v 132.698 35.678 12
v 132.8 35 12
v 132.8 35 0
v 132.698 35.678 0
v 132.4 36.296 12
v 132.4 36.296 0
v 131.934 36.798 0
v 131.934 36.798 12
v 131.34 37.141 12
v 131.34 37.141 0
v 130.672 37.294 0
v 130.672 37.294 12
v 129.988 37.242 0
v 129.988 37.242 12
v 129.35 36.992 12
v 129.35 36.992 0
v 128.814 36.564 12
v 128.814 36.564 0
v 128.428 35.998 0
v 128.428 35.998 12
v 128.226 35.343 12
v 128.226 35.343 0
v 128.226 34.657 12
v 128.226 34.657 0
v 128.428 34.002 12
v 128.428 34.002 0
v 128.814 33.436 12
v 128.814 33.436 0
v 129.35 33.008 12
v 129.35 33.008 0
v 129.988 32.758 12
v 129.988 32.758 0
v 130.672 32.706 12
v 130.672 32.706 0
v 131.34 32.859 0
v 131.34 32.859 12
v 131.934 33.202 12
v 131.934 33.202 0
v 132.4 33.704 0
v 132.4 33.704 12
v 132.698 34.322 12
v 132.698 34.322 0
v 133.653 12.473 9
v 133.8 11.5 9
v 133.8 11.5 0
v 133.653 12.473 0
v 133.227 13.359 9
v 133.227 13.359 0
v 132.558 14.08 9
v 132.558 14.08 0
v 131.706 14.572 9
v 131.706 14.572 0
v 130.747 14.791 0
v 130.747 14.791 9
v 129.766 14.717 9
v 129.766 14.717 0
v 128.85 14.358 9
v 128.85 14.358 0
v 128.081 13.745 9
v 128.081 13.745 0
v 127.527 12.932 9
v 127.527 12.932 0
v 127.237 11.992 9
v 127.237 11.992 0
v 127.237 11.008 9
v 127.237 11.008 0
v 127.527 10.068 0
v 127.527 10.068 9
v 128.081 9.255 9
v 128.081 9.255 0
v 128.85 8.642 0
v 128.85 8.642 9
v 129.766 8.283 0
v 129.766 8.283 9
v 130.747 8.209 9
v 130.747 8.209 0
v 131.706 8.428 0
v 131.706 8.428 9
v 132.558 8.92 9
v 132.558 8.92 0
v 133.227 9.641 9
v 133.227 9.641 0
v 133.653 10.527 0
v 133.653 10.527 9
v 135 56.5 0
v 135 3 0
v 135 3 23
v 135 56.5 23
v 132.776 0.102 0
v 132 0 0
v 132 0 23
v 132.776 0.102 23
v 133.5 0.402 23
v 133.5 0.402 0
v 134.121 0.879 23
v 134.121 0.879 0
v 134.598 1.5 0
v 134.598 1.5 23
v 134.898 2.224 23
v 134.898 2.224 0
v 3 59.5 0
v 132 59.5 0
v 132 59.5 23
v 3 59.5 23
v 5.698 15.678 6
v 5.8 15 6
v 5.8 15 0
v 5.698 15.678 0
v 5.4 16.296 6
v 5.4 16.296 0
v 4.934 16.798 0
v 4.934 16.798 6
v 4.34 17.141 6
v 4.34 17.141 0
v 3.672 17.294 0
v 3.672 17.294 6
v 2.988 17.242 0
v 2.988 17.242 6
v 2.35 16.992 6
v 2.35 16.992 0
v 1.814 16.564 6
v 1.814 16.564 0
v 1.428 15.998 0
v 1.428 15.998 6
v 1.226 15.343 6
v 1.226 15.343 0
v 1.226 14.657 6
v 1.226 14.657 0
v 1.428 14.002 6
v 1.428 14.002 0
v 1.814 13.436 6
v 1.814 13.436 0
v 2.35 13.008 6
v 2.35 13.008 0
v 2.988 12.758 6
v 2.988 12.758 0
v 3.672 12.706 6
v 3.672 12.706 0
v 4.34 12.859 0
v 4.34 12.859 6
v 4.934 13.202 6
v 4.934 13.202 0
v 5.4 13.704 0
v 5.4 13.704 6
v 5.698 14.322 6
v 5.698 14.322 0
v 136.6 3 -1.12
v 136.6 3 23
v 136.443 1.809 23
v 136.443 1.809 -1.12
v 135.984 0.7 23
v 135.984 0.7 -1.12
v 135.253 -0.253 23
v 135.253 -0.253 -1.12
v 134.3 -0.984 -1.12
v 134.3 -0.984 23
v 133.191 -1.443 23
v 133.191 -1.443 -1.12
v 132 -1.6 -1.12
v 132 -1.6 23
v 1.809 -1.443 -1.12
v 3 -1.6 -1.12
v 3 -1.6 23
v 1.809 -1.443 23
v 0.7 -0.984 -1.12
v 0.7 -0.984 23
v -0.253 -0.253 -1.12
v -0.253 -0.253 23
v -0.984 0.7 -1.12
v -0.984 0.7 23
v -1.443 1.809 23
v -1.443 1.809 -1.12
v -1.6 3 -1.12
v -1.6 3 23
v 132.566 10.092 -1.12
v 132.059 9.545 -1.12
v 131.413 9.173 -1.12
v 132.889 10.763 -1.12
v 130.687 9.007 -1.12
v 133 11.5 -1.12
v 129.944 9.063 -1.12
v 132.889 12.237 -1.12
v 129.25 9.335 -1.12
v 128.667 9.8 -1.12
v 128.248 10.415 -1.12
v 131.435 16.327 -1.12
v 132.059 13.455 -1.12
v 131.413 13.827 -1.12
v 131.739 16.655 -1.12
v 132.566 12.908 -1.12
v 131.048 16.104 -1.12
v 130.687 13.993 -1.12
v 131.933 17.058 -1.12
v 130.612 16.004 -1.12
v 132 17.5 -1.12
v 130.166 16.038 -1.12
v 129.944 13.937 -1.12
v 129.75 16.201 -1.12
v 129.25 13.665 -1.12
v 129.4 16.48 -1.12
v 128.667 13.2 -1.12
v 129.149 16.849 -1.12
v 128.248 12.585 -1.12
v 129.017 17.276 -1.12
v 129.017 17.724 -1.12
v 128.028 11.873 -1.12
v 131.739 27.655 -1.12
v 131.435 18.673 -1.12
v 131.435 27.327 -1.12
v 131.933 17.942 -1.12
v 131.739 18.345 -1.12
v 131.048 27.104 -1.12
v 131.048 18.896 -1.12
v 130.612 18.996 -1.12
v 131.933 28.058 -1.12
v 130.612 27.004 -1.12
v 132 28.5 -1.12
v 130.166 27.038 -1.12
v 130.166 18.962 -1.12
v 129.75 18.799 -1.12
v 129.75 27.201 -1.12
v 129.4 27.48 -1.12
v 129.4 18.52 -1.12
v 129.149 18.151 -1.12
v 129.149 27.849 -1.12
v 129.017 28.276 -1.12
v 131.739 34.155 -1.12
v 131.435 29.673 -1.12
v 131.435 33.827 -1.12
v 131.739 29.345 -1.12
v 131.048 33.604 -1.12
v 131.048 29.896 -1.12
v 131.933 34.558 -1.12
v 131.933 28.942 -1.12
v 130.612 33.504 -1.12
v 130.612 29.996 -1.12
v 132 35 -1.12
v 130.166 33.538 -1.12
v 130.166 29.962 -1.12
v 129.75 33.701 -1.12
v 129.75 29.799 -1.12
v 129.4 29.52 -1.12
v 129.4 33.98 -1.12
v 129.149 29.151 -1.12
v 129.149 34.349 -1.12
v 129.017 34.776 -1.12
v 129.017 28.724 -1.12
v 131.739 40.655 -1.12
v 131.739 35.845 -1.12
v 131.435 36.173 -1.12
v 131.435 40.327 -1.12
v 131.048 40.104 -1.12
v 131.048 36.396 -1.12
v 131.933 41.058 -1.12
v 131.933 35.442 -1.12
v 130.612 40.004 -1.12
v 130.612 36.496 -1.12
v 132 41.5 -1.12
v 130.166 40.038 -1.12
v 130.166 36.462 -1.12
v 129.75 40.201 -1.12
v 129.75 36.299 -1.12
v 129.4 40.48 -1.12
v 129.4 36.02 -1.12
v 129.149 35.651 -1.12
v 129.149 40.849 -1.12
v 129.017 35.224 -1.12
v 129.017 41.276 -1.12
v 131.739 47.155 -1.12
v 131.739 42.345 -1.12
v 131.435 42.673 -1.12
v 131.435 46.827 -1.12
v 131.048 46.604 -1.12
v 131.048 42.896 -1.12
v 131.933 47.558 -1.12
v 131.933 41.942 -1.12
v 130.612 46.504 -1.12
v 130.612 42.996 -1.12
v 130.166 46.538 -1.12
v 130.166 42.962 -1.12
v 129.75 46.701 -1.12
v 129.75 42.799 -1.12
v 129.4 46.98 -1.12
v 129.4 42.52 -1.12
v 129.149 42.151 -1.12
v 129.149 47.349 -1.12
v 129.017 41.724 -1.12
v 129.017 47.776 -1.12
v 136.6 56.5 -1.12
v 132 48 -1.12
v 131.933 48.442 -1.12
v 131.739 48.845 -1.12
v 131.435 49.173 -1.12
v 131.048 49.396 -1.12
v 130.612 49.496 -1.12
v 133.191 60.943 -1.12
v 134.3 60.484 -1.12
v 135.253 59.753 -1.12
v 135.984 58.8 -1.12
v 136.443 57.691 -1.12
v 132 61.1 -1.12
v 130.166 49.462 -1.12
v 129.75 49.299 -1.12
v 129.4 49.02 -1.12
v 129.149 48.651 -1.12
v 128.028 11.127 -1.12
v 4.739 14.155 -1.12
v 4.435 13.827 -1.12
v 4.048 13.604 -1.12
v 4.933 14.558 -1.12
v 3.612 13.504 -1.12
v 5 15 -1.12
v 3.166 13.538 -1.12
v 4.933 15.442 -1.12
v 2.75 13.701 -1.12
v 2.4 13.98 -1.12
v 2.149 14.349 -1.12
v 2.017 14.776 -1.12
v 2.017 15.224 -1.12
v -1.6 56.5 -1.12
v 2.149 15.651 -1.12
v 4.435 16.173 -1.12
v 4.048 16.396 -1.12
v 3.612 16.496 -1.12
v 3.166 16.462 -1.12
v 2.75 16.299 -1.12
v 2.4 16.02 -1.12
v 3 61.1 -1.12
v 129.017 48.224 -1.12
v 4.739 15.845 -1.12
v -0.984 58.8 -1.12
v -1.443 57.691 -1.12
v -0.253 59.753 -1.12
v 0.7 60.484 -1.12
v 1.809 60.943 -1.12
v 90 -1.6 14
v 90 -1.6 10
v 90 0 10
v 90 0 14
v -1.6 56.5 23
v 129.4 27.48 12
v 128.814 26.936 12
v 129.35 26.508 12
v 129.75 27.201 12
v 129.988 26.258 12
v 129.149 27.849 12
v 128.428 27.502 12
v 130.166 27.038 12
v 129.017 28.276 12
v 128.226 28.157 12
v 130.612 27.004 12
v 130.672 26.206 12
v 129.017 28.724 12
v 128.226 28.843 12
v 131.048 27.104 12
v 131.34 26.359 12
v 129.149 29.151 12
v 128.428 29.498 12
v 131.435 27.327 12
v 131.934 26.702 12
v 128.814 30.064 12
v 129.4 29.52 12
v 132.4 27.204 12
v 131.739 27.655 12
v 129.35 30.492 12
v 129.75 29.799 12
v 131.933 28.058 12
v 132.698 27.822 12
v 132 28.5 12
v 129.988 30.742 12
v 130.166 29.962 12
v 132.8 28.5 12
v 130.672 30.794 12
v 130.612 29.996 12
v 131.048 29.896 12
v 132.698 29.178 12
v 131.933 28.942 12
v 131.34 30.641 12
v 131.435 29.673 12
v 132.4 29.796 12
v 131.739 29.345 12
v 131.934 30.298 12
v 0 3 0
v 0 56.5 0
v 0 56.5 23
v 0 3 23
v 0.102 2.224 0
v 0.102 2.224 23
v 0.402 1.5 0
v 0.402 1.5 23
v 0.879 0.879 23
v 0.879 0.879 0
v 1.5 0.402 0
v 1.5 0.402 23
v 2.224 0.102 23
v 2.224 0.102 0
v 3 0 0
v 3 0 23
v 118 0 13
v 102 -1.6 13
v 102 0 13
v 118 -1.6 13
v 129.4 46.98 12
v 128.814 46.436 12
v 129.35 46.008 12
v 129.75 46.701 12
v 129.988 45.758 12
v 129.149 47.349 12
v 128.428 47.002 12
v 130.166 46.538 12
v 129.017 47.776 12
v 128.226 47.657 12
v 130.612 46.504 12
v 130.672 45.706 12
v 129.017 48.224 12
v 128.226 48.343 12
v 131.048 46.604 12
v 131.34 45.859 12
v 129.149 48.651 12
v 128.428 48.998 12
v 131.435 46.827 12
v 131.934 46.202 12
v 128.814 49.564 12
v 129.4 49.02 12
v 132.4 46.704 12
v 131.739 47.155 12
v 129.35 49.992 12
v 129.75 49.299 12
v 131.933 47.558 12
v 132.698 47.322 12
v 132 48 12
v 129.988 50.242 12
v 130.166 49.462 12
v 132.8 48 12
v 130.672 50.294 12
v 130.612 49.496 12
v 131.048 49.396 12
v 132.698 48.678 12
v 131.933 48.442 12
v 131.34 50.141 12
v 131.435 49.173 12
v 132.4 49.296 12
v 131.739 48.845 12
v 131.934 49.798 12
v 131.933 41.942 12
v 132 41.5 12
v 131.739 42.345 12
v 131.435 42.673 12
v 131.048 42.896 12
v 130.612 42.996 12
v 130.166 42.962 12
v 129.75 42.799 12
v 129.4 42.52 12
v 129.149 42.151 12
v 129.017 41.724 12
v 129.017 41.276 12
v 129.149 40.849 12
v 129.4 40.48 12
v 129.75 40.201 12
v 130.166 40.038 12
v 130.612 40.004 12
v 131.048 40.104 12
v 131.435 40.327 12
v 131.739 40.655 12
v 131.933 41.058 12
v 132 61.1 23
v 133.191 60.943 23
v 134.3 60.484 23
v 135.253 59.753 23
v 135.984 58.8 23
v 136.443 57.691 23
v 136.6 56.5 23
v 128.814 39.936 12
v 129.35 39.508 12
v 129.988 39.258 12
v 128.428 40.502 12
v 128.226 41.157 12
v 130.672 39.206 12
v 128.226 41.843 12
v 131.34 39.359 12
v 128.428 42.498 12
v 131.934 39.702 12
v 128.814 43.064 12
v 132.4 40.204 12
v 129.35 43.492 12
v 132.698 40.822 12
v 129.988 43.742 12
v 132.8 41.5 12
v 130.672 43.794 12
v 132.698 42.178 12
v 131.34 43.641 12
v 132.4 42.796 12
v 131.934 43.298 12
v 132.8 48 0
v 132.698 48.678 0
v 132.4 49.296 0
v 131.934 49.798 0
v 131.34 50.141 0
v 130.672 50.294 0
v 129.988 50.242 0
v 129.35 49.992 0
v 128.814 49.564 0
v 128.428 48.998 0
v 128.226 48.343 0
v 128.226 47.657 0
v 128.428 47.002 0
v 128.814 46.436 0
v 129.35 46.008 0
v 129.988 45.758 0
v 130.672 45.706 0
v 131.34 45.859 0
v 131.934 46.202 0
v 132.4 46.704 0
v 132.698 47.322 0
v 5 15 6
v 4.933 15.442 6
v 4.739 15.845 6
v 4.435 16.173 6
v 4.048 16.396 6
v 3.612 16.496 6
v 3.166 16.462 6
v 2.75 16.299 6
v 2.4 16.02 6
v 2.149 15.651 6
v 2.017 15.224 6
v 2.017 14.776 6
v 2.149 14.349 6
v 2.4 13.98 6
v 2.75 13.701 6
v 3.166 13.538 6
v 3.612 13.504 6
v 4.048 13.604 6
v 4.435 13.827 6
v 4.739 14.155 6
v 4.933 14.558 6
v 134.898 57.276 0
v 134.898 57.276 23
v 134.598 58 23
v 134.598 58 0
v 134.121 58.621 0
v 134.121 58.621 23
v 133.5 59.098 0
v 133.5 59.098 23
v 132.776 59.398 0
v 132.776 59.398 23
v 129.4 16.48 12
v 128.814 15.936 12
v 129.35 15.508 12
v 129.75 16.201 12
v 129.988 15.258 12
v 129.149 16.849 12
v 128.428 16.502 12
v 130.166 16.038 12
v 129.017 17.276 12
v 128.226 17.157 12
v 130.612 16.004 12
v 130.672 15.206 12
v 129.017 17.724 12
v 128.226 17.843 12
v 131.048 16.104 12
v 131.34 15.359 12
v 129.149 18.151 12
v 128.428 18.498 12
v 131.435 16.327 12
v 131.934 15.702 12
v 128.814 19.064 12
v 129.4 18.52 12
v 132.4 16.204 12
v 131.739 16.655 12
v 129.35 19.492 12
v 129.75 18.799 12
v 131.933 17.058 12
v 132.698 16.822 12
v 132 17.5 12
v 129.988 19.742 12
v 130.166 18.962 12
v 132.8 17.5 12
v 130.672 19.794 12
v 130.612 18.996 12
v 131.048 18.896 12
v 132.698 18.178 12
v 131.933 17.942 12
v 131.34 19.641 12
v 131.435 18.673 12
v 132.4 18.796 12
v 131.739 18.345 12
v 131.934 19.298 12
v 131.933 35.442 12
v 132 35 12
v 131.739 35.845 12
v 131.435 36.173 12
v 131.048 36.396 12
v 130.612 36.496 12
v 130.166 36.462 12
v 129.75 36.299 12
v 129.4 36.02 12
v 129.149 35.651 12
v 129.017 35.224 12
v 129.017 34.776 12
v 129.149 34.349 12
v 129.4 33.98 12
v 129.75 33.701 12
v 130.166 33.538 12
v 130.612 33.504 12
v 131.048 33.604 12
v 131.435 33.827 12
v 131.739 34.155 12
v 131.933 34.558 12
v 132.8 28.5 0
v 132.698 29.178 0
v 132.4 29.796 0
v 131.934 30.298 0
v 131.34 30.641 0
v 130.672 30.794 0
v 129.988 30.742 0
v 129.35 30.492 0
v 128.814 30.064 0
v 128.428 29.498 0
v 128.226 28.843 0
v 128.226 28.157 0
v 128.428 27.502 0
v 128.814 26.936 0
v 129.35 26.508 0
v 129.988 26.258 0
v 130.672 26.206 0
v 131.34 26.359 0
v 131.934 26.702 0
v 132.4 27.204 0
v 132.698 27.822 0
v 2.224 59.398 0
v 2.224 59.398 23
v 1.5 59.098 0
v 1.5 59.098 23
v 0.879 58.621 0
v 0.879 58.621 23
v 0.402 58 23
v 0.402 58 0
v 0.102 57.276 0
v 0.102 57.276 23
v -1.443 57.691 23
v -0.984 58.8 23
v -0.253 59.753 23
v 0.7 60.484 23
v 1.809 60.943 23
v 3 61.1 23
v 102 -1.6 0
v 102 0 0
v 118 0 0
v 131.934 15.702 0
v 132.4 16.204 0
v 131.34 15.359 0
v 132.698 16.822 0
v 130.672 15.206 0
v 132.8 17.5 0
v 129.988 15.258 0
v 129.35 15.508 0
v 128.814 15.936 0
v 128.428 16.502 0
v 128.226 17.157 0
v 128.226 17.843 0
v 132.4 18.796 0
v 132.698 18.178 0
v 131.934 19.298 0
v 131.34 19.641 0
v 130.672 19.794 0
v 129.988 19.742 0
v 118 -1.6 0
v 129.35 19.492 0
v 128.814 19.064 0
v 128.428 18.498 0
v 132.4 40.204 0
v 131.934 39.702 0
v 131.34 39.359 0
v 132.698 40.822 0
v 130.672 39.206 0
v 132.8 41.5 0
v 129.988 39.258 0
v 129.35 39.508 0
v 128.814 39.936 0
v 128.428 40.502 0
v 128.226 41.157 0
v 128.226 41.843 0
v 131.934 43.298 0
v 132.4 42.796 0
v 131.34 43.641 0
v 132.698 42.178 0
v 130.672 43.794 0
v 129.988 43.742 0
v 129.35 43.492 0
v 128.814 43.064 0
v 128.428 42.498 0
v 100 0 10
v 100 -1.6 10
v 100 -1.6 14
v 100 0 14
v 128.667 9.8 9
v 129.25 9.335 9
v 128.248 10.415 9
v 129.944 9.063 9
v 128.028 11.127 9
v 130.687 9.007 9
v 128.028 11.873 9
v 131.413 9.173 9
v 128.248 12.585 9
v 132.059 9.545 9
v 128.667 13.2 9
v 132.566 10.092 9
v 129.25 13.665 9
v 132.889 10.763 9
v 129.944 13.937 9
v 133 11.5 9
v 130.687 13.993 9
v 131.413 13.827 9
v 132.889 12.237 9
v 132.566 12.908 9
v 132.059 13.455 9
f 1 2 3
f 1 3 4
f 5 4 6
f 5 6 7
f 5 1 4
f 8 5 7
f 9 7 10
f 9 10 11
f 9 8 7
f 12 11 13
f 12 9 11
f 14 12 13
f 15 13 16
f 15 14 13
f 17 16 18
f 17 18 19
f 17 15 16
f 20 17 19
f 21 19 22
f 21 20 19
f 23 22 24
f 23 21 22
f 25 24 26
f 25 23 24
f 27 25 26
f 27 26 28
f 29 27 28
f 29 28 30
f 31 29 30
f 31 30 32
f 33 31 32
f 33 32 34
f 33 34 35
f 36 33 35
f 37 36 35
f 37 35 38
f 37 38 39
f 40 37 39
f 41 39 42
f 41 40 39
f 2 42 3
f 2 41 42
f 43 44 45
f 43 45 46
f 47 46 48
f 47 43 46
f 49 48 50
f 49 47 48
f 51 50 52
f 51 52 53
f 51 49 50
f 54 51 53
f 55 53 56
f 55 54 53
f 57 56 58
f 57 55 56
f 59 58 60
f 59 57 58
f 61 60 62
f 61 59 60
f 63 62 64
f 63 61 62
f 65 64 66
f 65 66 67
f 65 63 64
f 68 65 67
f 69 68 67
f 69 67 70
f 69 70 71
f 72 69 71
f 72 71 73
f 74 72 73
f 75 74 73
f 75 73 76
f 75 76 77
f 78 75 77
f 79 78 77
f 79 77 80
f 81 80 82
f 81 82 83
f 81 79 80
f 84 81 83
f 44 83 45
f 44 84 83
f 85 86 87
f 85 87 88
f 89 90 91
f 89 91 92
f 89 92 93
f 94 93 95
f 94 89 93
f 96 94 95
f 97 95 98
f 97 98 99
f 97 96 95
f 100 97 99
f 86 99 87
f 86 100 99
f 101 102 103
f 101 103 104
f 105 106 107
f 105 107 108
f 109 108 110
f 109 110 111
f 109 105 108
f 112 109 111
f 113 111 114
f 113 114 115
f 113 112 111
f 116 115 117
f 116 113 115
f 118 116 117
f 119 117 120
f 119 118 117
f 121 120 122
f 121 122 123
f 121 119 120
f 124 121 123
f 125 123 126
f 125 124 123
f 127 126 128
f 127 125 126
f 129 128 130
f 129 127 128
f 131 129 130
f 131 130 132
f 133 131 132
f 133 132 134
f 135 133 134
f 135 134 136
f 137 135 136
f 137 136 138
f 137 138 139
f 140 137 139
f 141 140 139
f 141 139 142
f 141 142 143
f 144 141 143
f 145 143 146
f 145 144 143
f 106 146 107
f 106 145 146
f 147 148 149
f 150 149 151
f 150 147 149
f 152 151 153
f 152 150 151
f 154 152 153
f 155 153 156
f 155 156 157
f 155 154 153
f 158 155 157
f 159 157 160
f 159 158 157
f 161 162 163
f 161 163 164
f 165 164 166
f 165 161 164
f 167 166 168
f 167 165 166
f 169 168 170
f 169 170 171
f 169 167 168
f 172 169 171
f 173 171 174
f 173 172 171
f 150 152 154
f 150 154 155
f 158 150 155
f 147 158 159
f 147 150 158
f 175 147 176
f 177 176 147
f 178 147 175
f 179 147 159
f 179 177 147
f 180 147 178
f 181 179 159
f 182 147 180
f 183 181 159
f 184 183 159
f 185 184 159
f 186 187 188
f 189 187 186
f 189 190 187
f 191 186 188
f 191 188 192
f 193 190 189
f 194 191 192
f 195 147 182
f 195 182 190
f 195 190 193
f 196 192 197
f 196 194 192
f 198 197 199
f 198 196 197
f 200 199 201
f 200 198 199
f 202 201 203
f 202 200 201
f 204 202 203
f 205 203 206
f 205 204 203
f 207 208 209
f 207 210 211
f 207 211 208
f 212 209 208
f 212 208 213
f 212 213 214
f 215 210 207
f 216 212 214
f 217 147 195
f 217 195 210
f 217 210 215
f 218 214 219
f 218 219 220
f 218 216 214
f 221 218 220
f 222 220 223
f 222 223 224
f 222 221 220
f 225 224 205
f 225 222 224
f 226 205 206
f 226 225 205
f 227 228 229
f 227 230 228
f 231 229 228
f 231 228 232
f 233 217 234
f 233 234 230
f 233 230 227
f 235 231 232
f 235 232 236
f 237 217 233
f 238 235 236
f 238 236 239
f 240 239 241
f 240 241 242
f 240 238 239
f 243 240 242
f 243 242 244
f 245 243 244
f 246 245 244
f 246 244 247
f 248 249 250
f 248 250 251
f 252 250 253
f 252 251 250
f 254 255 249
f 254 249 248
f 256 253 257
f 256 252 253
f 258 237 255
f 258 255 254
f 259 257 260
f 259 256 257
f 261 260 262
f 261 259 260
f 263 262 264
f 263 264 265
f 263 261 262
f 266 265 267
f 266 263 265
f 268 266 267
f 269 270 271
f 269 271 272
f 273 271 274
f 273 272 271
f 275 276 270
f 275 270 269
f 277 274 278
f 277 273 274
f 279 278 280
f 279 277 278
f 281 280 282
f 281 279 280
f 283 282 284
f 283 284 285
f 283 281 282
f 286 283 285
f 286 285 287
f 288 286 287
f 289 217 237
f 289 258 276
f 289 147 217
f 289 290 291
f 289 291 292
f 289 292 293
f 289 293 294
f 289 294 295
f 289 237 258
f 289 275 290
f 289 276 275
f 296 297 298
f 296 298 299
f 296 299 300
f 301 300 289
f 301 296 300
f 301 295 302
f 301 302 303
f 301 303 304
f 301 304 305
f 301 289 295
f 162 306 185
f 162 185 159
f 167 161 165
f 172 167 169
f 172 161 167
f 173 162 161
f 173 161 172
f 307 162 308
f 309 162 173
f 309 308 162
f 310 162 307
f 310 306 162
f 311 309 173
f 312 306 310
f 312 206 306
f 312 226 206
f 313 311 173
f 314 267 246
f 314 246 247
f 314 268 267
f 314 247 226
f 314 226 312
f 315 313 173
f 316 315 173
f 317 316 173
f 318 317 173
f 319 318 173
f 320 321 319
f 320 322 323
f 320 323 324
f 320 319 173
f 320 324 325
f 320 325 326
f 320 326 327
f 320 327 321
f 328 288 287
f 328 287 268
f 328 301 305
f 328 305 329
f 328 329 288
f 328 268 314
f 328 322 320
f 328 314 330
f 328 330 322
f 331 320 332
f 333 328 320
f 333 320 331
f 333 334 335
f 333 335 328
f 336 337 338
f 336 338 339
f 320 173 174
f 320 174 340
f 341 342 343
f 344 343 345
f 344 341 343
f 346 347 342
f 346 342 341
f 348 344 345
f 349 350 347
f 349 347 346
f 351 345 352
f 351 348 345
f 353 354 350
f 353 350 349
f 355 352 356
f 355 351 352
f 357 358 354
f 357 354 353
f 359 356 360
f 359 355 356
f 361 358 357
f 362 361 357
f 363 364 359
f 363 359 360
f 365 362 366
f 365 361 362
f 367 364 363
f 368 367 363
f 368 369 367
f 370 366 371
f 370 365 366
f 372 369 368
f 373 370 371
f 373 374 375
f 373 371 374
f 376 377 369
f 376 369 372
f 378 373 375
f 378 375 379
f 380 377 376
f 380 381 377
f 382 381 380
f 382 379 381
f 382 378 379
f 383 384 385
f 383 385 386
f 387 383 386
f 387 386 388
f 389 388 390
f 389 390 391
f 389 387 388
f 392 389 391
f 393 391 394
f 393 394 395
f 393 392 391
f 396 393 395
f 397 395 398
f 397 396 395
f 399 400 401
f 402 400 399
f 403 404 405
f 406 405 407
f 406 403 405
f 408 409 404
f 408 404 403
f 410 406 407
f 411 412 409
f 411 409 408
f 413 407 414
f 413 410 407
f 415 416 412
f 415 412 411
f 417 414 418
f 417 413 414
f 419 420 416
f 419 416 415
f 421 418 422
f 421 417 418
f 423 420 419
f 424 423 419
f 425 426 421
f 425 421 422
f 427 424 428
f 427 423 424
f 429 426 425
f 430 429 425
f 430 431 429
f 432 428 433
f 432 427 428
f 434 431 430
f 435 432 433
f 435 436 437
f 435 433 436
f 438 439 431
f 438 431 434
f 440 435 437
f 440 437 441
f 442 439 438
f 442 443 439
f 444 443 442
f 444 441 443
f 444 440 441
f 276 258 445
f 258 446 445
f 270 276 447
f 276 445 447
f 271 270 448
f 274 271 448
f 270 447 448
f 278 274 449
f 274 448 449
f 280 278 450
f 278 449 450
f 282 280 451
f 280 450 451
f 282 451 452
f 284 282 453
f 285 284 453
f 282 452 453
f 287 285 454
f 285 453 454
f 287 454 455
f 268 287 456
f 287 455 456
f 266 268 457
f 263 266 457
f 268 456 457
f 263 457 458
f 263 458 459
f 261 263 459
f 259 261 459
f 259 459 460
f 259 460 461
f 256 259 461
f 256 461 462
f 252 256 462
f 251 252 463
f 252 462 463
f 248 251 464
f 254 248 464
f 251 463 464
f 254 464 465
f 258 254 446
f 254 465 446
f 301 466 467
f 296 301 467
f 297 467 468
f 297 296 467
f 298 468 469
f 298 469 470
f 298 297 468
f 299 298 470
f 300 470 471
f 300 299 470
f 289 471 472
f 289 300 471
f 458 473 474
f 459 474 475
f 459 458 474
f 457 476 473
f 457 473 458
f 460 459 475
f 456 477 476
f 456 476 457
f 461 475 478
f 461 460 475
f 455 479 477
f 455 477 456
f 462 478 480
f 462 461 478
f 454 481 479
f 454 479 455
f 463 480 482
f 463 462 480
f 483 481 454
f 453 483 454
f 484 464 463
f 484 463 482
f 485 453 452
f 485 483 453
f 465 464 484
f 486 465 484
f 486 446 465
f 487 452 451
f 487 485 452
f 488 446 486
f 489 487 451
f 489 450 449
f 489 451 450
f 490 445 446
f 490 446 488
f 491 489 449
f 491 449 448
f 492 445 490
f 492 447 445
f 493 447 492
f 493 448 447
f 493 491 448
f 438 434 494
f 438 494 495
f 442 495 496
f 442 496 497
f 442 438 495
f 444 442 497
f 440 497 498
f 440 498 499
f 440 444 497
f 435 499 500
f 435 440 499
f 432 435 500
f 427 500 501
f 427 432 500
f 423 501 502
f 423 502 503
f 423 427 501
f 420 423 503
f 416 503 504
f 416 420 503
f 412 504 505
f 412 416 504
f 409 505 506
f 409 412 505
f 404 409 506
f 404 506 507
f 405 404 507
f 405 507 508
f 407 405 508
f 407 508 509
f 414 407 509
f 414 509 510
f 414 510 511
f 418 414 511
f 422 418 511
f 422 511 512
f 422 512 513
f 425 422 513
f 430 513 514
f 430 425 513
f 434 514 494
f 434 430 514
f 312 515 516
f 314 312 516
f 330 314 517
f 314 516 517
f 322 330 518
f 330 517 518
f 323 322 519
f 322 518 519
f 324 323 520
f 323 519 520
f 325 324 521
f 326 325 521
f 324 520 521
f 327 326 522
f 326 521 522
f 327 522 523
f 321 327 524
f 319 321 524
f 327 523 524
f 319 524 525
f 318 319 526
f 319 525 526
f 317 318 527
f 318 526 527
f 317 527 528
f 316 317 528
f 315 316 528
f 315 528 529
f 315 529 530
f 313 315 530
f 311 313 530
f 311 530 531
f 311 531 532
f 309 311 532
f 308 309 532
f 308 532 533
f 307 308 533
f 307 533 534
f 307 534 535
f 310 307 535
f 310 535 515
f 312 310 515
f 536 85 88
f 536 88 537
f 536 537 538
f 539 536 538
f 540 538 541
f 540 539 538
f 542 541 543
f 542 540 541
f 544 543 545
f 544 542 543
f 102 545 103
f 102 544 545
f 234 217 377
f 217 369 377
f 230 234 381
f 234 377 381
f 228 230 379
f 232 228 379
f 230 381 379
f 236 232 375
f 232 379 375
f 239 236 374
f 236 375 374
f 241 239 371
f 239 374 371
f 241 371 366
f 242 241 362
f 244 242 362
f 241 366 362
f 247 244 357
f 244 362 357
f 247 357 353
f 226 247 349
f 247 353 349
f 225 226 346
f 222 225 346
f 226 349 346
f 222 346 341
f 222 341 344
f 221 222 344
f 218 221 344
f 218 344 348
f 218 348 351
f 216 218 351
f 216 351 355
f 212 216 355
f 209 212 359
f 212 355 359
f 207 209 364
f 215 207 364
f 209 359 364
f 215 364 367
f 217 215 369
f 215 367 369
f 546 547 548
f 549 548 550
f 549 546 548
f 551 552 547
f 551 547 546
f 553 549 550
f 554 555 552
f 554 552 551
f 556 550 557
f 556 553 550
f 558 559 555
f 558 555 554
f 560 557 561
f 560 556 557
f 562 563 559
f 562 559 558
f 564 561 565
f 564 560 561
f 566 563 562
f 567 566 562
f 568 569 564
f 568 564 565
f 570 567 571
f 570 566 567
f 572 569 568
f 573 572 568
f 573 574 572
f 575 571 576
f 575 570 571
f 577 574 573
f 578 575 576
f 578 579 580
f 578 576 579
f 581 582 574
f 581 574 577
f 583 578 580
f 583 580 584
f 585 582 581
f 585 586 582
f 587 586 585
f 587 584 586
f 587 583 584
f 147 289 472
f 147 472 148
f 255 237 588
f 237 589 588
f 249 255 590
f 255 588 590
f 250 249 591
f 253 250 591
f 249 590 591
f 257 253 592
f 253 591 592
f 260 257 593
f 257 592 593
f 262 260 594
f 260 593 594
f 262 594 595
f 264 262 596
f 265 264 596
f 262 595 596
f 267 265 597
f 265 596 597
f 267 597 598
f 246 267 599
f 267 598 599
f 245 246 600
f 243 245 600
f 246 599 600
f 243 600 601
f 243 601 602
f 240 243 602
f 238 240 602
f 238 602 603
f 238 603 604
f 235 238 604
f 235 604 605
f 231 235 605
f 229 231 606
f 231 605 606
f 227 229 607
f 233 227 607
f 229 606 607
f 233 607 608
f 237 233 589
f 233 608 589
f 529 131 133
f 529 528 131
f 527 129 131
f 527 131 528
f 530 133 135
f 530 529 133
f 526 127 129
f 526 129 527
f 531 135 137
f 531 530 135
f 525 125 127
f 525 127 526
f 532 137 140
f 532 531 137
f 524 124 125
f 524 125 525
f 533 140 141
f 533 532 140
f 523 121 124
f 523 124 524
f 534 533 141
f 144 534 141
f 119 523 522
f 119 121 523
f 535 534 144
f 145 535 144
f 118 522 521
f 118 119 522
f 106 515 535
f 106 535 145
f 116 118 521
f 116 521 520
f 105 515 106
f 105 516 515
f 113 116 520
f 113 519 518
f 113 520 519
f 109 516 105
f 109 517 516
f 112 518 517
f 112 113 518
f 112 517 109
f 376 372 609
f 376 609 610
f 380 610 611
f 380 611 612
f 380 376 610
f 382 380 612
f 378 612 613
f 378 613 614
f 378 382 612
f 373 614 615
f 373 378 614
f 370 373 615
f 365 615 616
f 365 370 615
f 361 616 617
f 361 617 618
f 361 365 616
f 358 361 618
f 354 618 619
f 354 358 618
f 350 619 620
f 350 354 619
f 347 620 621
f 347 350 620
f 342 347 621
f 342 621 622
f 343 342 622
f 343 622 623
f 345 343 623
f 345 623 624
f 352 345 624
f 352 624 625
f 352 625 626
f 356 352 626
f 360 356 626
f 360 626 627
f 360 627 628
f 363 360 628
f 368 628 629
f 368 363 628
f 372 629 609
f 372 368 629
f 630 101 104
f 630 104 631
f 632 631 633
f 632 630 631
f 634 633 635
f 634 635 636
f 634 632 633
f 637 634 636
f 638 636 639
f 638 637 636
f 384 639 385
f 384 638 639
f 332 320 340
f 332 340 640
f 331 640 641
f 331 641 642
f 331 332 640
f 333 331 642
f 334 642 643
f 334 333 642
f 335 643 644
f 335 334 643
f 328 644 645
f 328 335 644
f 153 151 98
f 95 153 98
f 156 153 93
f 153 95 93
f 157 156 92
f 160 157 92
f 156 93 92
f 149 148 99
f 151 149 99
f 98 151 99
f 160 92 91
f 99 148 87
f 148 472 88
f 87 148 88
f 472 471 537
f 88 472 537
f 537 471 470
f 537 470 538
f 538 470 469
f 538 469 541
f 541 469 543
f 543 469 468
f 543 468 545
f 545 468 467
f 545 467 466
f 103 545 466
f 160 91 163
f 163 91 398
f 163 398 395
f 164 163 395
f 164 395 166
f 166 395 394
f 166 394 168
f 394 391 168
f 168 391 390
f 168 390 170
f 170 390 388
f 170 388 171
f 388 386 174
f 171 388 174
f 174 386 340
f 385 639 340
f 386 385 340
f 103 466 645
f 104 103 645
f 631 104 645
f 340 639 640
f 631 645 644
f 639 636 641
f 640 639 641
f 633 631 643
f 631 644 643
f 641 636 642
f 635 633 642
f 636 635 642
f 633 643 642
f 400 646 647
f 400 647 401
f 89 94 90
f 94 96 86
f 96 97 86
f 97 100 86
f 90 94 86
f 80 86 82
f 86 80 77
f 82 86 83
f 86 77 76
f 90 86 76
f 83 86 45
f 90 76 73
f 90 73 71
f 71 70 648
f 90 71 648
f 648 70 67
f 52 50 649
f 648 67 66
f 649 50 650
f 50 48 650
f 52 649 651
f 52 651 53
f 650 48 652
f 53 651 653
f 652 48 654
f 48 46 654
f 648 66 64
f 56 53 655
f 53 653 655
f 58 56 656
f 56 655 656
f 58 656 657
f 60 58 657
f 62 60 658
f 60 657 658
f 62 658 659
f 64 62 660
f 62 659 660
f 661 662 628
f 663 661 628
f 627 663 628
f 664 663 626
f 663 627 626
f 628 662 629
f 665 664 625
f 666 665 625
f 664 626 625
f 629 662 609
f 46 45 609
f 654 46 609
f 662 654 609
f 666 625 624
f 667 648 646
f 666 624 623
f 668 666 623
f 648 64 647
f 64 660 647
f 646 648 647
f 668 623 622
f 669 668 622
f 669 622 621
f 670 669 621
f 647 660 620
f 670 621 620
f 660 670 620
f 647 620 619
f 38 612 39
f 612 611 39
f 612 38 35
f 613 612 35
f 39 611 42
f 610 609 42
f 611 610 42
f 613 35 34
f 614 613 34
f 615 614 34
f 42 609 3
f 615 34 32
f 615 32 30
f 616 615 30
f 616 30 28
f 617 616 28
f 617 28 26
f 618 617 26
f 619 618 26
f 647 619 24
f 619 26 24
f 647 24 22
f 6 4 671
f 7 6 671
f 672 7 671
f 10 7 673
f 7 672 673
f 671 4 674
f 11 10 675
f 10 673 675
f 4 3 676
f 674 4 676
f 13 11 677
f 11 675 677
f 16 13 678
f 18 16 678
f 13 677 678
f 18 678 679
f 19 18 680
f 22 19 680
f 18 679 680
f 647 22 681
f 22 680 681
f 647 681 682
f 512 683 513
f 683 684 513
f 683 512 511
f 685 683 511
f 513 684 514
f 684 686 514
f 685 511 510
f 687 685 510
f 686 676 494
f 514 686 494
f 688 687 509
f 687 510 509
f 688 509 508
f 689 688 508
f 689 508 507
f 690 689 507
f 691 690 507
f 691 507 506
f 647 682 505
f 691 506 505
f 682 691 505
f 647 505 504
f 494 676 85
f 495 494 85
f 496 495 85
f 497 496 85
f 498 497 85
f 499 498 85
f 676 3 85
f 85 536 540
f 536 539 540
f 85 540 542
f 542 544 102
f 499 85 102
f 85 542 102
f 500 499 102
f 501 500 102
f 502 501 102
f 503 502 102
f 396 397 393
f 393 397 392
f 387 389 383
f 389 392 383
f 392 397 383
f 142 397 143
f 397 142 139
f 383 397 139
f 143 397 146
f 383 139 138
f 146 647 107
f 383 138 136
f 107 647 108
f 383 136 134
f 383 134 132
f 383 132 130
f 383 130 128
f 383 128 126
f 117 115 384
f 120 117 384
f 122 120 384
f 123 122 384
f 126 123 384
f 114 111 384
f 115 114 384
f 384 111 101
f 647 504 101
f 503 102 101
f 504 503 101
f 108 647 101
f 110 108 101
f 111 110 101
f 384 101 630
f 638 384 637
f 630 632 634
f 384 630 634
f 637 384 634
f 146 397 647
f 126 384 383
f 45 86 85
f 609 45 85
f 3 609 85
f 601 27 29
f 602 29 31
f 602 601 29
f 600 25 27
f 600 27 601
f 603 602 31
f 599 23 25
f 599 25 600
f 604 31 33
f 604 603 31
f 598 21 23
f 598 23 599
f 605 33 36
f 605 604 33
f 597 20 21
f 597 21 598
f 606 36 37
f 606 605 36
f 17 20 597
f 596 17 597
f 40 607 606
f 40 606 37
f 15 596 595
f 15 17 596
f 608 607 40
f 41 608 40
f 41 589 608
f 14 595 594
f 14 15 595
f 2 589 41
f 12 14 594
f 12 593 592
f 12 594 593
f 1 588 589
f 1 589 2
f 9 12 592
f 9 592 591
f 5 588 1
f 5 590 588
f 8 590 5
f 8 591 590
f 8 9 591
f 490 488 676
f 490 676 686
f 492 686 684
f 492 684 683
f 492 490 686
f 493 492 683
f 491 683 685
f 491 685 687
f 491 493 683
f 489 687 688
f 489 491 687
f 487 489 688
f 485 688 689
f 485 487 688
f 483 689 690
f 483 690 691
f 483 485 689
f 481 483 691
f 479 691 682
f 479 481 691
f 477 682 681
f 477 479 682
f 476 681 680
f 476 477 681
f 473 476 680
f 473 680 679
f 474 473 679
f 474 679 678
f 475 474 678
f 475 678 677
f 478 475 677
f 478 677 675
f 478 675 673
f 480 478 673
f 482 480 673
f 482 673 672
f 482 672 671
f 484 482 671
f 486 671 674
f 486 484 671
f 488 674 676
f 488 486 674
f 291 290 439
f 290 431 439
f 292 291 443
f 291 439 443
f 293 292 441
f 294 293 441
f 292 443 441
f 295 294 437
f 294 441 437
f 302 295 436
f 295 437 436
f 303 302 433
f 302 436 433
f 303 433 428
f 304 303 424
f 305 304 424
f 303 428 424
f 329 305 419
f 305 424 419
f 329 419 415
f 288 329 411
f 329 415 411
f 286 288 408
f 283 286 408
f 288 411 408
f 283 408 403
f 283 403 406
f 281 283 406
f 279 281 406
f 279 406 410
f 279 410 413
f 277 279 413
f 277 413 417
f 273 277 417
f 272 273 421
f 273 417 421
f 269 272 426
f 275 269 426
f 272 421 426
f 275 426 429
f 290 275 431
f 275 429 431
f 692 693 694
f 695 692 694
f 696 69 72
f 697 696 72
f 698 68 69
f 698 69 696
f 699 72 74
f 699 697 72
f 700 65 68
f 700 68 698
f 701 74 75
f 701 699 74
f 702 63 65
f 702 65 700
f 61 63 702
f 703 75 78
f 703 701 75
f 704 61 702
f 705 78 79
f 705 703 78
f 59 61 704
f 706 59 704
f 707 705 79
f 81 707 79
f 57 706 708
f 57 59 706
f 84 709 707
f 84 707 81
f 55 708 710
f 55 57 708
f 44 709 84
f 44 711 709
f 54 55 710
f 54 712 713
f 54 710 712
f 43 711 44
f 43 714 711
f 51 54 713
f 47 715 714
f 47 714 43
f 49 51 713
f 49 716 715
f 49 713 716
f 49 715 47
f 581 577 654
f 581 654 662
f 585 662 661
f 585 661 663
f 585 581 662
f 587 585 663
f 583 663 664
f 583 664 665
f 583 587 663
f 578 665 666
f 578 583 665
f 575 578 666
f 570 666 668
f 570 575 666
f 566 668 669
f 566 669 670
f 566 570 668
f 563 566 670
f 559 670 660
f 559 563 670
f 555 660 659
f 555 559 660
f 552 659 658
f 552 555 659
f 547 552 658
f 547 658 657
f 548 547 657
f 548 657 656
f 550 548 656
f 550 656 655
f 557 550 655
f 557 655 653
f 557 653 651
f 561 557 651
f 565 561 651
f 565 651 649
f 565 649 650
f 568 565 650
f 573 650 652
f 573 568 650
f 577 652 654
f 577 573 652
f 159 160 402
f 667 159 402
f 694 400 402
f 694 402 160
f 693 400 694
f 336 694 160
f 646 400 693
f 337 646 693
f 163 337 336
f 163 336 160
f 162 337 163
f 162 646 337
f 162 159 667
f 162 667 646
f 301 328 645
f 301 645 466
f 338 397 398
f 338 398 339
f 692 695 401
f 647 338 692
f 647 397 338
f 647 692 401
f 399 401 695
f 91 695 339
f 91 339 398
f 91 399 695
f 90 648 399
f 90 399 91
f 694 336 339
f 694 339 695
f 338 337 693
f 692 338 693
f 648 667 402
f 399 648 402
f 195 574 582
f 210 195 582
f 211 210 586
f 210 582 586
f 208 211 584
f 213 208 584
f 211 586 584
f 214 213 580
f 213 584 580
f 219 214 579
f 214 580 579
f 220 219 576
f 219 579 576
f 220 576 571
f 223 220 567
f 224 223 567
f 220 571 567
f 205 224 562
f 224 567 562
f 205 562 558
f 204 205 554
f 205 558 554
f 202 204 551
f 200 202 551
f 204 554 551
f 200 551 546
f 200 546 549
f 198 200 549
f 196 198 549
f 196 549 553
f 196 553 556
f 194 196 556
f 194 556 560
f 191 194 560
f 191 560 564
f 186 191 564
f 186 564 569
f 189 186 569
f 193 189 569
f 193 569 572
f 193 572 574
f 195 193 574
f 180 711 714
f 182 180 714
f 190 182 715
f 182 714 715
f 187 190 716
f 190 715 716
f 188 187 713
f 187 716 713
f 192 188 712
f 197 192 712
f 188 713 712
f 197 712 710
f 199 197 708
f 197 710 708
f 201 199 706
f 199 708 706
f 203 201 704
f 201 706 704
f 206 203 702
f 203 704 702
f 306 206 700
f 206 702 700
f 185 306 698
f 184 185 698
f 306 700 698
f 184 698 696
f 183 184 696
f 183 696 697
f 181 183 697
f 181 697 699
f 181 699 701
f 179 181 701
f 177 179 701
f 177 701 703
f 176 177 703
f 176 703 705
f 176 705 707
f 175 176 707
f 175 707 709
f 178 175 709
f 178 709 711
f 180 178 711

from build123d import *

# Parameters (mm, degrees)
PARED_DEPTH             = 23
CONECTORES_REACH        = 154.052
CROQUIS2_W              = 16
CROQUIS2_H              = 13
CROQUIS2_W_2            = 10
CROQUIS2_H_2            = 4
BASE_START              = -1.12
BASE_FRENTE_DEPTH       = 1.12
LUCES_REACH             = 153.399
CROQUIS3_R              = 1.5
CROQUIS3_R_2            = 2.5
SALIENTE_EXTRUIR1_START = 12
CROQUIS3_3_R            = 2.3
CROQUIS3_3_R_2          = 1.5
SALIENTE_EXTRUIR1_DEPTH = 12
SALIENTE_EXTRUIR2_START = 9
CROQUIS3_4_R            = 3.3
CROQUIS3_4_R_2          = 2.5
SALIENTE_EXTRUIR2_DEPTH = 9
SALIENTE_EXTRUIR3_START = 6
CROQUIS3_5_R            = 2.3
CROQUIS3_5_R_2          = 1.5
SALIENTE_EXTRUIR3_DEPTH = 6


with BuildPart() as part:
    # Croquis1 → pared (new body)
    with BuildSketch(Plane.XY):
        with BuildLine():
            Line((3, 61.1), (132, 61.1))
            ThreePointArc((132, 61.1), (135.252691193, 59.752691193), (136.6, 56.5))
            Line((136.6, 56.5), (136.6, 3))
            ThreePointArc((136.6, 3), (135.252691193, -0.252691193), (132, -1.6))
            Line((132, -1.6), (3, -1.6))
            ThreePointArc((3, -1.6), (-0.252691193, -0.252691193), (-1.6, 3))
            Line((-1.6, 3), (-1.6, 56.5))
            ThreePointArc((-1.6, 56.5), (-0.252691193, 59.752691193), (3, 61.1))
        make_face()
        with BuildLine():
            Line((3, 0), (132, 0))
            ThreePointArc((132, 0), (134.121320344, 0.878679656), (135, 3))
            Line((135, 3), (135, 56.5))
            ThreePointArc((135, 56.5), (134.121320344, 58.621320344), (132, 59.5))
            Line((132, 59.5), (3, 59.5))
            ThreePointArc((3, 59.5), (0.878679656, 58.621320344), (0, 56.5))
            Line((0, 56.5), (0, 3))
            ThreePointArc((0, 3), (0.878679656, 0.878679656), (3, 0))
        make_face(mode=Mode.SUBTRACT)
    extrude(amount=PARED_DEPTH)

    # Croquis2 → conectores (cut, up to next)
    with BuildSketch(Plane.XZ.offset(1.6), mode=Mode.PRIVATE) as conectores_sk1:
        with Locations((110, 6.5)):
            Rectangle(CROQUIS2_W, CROQUIS2_H)
    conectores_tool1 = extrude(conectores_sk1.sketch, amount=-CONECTORES_REACH, mode=Mode.PRIVATE) & part.part
    # Croquis2 → conectores (cut, up to next)
    with BuildSketch(Plane.XZ.offset(1.6), mode=Mode.PRIVATE) as conectores_sk2:
        with Locations((95, 12)):
            Rectangle(CROQUIS2_W_2, CROQUIS2_H_2)
    conectores_tool2 = extrude(conectores_sk2.sketch, amount=-CONECTORES_REACH, mode=Mode.PRIVATE) & part.part
    add(conectores_tool1.solids().sort_by_distance((110, -1.6, 6.5))[0], mode=Mode.SUBTRACT)
    add(conectores_tool2.solids().sort_by_distance((95, -1.6, 12))[0], mode=Mode.SUBTRACT)

    # Croquis1<2> → base frente (add)
    with BuildSketch(Plane.XY.offset(BASE_START)):
        with BuildLine():
            Line((3, 61.1), (132, 61.1))
            ThreePointArc((132, 61.1), (135.252691193, 59.752691193), (136.6, 56.5))
            Line((136.6, 56.5), (136.6, 3))
            ThreePointArc((136.6, 3), (135.252691193, -0.252691193), (132, -1.6))
            Line((132, -1.6), (3, -1.6))
            ThreePointArc((3, -1.6), (-0.252691193, -0.252691193), (-1.6, 3))
            Line((-1.6, 3), (-1.6, 56.5))
            ThreePointArc((-1.6, 56.5), (-0.252691193, 59.752691193), (3, 61.1))
        make_face()
    extrude(amount=BASE_FRENTE_DEPTH)

    # Croquis3 → luces (cut, up to next)
    with BuildSketch(Plane.XY, mode=Mode.PRIVATE) as luces_sk1:
        with Locations((130.5, 48)):
            Circle(CROQUIS3_R)
    luces_tool1 = extrude(luces_sk1.sketch, amount=-LUCES_REACH, mode=Mode.PRIVATE) & part.part
    # Croquis3 → luces (cut, up to next)
    with BuildSketch(Plane.XY, mode=Mode.PRIVATE) as luces_sk2:
        with Locations((130.5, 41.5)):
            Circle(CROQUIS3_R)
    luces_tool2 = extrude(luces_sk2.sketch, amount=-LUCES_REACH, mode=Mode.PRIVATE) & part.part
    # Croquis3 → luces (cut, up to next)
    with BuildSketch(Plane.XY, mode=Mode.PRIVATE) as luces_sk3:
        with Locations((130.5, 35)):
            Circle(CROQUIS3_R)
    luces_tool3 = extrude(luces_sk3.sketch, amount=-LUCES_REACH, mode=Mode.PRIVATE) & part.part
    # Croquis3 → luces (cut, up to next)
    with BuildSketch(Plane.XY, mode=Mode.PRIVATE) as luces_sk4:
        with Locations((130.5, 28.5)):
            Circle(CROQUIS3_R)
    luces_tool4 = extrude(luces_sk4.sketch, amount=-LUCES_REACH, mode=Mode.PRIVATE) & part.part
    # Croquis3 → luces (cut, up to next)
    with BuildSketch(Plane.XY, mode=Mode.PRIVATE) as luces_sk5:
        with Locations((130.5, 17.5)):
            Circle(CROQUIS3_R)
    luces_tool5 = extrude(luces_sk5.sketch, amount=-LUCES_REACH, mode=Mode.PRIVATE) & part.part
    # Croquis3 → luces (cut, up to next)
    with BuildSketch(Plane.XY, mode=Mode.PRIVATE) as luces_sk6:
        with Locations((130.5, 11.5)):
            Circle(CROQUIS3_R_2)
    luces_tool6 = extrude(luces_sk6.sketch, amount=-LUCES_REACH, mode=Mode.PRIVATE) & part.part
    # Croquis3 → luces (cut, up to next)
    with BuildSketch(Plane.XY, mode=Mode.PRIVATE) as luces_sk7:
        with Locations((3.5, 15)):
            Circle(CROQUIS3_R)
    luces_tool7 = extrude(luces_sk7.sketch, amount=-LUCES_REACH, mode=Mode.PRIVATE) & part.part
    add(luces_tool1.solids().sort_by_distance((130.5, 48, 0))[0], mode=Mode.SUBTRACT)
    add(luces_tool2.solids().sort_by_distance((130.5, 41.5, 0))[0], mode=Mode.SUBTRACT)
    add(luces_tool3.solids().sort_by_distance((130.5, 35, 0))[0], mode=Mode.SUBTRACT)
    add(luces_tool4.solids().sort_by_distance((130.5, 28.5, 0))[0], mode=Mode.SUBTRACT)
    add(luces_tool5.solids().sort_by_distance((130.5, 17.5, 0))[0], mode=Mode.SUBTRACT)
    add(luces_tool6.solids().sort_by_distance((130.5, 11.5, 0))[0], mode=Mode.SUBTRACT)
    add(luces_tool7.solids().sort_by_distance((3.5, 15, 0))[0], mode=Mode.SUBTRACT)

    # Croquis3<3> → Saliente-Extruir1 (add)
    # profile 1 of 5: a face of its own
    with BuildSketch(Plane.XY.offset(SALIENTE_EXTRUIR1_START)):
        with Locations((130.5, 17.5)):
            Circle(CROQUIS3_3_R)
        with Locations((130.5, 17.5)):
            Circle(CROQUIS3_3_R_2, mode=Mode.SUBTRACT)
    # profile 2 of 5: a face of its own
    with BuildSketch(Plane.XY.offset(SALIENTE_EXTRUIR1_START)):
        with Locations((130.5, 28.5)):
            Circle(CROQUIS3_3_R)
        with Locations((130.5, 28.5)):
            Circle(CROQUIS3_3_R_2, mode=Mode.SUBTRACT)
    # profile 3 of 5: a face of its own
    with BuildSketch(Plane.XY.offset(SALIENTE_EXTRUIR1_START)):
        with Locations((130.5, 35)):
            Circle(CROQUIS3_3_R)
        with Locations((130.5, 35)):
            Circle(CROQUIS3_3_R_2, mode=Mode.SUBTRACT)
    # profile 4 of 5: a face of its own
    with BuildSketch(Plane.XY.offset(SALIENTE_EXTRUIR1_START)):
        with Locations((130.5, 41.5)):
            Circle(CROQUIS3_3_R)
        with Locations((130.5, 41.5)):
            Circle(CROQUIS3_3_R_2, mode=Mode.SUBTRACT)
    # profile 5 of 5: a face of its own
    with BuildSketch(Plane.XY.offset(SALIENTE_EXTRUIR1_START)):
        with Locations((130.5, 48)):
            Circle(CROQUIS3_3_R)
        with Locations((130.5, 48)):
            Circle(CROQUIS3_3_R_2, mode=Mode.SUBTRACT)
    extrude(amount=-SALIENTE_EXTRUIR1_DEPTH)

    # Croquis3<4> → Saliente-Extruir2 (add)
    with BuildSketch(Plane.XY.offset(SALIENTE_EXTRUIR2_START)):
        with Locations((130.5, 11.5)):
            Circle(CROQUIS3_4_R)
        with Locations((130.5, 11.5)):
            Circle(CROQUIS3_4_R_2, mode=Mode.SUBTRACT)
    extrude(amount=-SALIENTE_EXTRUIR2_DEPTH)

    # Croquis3<5> → Saliente-Extruir3 (add)
    with BuildSketch(Plane.XY.offset(SALIENTE_EXTRUIR3_START)):
        with Locations((3.5, 15)):
            Circle(CROQUIS3_5_R)
        with Locations((3.5, 15)):
            Circle(CROQUIS3_5_R_2, mode=Mode.SUBTRACT)
    extrude(amount=-SALIENTE_EXTRUIR3_DEPTH)


solid = part.part
